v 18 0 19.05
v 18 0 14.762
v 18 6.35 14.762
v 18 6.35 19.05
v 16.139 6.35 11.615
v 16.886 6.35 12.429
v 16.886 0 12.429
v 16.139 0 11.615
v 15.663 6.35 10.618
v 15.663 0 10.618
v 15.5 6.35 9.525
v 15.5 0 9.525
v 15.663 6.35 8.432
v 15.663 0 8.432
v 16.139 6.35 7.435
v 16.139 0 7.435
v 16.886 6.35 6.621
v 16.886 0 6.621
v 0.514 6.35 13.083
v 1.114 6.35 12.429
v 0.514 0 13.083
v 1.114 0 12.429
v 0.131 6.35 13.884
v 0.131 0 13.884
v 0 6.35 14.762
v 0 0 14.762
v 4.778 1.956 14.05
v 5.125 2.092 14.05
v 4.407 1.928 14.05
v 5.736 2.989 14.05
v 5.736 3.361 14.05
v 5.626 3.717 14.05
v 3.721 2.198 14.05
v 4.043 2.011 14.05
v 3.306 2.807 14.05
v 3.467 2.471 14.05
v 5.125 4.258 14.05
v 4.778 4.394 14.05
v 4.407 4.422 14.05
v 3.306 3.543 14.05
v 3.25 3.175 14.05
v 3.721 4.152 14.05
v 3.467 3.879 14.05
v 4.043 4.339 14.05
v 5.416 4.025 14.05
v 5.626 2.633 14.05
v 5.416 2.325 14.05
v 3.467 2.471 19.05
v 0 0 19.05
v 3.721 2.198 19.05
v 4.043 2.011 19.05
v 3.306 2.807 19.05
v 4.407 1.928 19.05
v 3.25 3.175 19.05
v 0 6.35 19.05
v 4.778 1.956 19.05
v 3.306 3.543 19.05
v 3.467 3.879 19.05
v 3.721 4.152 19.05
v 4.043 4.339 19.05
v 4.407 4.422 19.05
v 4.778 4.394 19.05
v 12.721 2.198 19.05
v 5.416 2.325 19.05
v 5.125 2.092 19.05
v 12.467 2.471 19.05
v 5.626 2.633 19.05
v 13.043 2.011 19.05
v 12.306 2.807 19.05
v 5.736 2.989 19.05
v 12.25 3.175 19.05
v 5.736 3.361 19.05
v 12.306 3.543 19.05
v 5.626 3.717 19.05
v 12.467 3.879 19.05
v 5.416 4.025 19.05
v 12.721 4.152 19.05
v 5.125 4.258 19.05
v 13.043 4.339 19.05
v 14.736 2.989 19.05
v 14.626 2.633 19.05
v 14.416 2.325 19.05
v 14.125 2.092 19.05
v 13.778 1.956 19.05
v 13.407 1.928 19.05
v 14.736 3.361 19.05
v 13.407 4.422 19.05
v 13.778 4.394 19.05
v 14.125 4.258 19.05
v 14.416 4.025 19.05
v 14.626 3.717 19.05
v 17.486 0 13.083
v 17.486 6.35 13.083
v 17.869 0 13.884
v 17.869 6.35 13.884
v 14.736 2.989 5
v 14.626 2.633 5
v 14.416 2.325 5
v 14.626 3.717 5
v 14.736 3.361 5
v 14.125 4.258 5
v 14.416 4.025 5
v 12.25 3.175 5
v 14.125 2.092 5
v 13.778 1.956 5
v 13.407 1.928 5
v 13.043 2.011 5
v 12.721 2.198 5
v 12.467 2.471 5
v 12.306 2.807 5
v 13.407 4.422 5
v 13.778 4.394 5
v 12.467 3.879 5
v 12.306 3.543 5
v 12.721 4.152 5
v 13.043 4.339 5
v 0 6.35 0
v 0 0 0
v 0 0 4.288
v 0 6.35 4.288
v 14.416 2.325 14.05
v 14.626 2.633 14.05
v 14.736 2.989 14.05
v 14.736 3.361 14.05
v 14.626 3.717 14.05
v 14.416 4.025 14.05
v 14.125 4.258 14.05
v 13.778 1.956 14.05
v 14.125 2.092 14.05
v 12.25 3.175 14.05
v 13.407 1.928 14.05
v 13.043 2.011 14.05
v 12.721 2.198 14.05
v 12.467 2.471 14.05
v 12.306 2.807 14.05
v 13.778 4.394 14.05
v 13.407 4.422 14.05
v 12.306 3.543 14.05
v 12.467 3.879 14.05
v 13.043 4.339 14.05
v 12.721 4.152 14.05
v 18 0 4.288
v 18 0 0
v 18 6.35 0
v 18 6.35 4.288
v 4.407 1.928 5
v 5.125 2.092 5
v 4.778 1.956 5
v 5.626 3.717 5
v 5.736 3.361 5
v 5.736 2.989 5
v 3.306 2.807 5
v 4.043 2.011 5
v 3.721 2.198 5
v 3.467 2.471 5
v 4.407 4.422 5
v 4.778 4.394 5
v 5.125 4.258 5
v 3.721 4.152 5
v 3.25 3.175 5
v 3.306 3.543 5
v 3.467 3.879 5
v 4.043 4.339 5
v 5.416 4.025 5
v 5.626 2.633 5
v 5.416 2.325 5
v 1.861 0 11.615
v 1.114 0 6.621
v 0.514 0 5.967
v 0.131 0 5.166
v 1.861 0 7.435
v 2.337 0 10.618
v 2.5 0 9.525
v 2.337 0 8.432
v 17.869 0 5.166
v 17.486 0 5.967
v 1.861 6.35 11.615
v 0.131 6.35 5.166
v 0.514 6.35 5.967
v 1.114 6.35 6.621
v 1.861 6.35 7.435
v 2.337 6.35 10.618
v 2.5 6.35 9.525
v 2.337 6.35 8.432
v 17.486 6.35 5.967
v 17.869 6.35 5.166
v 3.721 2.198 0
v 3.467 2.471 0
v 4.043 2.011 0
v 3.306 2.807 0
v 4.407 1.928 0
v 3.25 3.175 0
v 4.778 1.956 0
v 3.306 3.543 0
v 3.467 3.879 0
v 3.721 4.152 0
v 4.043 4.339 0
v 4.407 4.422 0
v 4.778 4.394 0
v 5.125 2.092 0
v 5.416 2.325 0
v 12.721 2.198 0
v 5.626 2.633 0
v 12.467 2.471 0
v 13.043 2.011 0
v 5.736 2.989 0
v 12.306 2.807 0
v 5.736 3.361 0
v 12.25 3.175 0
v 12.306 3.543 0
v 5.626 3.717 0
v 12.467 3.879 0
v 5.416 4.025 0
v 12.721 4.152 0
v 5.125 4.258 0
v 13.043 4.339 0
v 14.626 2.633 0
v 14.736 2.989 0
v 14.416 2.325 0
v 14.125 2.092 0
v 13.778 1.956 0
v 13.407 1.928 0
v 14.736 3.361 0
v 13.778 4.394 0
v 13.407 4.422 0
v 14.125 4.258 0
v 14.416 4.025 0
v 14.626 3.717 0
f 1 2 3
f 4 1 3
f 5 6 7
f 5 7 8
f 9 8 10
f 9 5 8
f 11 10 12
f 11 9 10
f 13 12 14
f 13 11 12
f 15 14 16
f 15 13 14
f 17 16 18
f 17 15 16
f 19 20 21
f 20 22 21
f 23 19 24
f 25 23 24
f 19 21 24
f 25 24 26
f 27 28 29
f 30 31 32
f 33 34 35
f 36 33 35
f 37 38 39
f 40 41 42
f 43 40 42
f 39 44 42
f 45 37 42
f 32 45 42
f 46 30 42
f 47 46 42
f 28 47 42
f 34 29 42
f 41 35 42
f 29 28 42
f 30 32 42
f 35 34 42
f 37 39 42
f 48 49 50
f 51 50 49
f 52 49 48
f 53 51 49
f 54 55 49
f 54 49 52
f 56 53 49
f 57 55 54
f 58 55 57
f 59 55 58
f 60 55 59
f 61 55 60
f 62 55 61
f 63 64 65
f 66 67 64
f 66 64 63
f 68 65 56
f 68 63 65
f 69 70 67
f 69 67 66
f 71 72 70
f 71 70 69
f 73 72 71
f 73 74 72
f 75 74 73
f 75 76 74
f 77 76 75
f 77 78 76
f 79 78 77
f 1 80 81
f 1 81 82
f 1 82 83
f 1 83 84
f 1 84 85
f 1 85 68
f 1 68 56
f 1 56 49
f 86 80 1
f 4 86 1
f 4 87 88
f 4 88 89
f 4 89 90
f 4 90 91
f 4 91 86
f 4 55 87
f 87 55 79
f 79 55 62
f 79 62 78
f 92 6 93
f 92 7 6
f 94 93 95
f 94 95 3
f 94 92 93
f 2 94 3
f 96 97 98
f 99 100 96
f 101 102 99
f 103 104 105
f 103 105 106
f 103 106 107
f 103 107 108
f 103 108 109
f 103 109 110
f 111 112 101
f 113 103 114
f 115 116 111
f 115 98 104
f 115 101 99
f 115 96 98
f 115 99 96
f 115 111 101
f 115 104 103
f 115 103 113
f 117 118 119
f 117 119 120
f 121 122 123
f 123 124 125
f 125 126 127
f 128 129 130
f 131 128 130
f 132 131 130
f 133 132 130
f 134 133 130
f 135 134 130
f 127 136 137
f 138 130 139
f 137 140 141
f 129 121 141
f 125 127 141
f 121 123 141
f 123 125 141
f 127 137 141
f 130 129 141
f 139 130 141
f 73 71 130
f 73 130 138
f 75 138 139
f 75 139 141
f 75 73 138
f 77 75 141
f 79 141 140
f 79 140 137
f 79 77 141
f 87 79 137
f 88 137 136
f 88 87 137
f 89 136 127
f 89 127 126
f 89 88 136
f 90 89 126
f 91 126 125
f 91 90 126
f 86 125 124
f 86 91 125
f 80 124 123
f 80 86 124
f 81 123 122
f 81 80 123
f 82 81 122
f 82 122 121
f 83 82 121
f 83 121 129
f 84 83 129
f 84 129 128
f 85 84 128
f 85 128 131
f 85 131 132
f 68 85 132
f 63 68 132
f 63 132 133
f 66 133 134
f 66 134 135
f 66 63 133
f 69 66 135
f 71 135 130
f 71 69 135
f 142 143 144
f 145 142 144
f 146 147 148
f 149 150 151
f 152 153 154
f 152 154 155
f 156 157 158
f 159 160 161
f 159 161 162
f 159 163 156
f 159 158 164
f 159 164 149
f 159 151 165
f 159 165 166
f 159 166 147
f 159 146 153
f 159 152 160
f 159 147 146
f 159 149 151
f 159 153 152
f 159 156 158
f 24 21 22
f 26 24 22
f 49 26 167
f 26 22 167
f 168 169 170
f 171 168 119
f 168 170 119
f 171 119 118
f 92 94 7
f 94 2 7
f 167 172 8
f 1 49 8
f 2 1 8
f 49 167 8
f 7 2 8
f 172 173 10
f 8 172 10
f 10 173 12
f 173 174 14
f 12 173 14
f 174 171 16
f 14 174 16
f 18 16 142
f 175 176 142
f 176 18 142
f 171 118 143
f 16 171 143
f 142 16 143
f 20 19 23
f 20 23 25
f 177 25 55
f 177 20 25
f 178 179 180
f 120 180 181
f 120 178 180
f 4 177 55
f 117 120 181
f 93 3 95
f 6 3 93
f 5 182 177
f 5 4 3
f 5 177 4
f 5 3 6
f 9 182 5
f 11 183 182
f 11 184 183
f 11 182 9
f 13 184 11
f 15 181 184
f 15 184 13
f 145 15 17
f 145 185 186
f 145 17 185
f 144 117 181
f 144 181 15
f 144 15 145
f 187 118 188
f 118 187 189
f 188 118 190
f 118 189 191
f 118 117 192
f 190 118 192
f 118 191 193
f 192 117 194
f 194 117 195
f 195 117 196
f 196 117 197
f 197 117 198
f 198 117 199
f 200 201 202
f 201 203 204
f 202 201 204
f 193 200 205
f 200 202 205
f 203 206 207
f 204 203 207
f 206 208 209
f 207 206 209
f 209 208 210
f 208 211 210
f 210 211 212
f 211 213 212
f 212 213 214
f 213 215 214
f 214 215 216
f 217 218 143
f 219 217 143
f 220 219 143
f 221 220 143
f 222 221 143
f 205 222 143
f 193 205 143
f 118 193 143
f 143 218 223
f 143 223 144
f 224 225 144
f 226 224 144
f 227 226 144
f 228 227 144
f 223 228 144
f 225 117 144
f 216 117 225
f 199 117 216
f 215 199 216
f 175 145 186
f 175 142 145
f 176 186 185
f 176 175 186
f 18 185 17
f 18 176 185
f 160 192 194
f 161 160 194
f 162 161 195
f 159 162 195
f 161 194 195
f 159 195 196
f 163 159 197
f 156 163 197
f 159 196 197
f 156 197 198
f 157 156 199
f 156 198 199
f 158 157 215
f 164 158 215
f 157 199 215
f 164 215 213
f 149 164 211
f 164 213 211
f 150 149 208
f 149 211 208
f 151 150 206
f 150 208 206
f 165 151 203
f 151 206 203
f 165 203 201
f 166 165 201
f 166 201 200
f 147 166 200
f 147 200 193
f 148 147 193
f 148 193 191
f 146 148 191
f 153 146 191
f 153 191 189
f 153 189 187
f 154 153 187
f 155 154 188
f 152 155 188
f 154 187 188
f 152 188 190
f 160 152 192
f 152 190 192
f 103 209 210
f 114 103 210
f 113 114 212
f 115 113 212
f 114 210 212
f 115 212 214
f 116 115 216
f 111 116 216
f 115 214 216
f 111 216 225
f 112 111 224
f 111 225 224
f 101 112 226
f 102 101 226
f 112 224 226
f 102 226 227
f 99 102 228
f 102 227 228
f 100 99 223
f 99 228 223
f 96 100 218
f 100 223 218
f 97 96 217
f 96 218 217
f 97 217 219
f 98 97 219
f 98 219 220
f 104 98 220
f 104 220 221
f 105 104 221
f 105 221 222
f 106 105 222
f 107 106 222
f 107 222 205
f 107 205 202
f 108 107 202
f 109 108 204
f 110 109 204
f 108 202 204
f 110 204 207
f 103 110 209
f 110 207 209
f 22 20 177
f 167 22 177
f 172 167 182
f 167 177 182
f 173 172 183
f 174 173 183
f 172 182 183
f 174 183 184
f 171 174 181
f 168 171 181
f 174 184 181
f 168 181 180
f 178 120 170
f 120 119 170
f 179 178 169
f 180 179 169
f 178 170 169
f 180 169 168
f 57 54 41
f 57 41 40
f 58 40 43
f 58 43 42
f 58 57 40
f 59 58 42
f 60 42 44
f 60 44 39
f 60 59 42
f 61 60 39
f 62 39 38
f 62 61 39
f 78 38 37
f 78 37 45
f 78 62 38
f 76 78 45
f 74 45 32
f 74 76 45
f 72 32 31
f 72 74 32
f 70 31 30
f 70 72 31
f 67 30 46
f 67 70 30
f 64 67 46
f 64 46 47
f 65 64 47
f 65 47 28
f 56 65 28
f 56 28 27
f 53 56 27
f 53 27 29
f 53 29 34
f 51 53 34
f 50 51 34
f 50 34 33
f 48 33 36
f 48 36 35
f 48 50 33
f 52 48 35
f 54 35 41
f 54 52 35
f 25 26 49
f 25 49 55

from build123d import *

# Parameters (mm, degrees)
SKETCH1_W           = 18
SKETCH1_H           = 6.35
BOSS_EXTRUDE1_DEPTH = 19.05
CUT_EXTRUDE1_DEPTH  = 7.35
SKETCH3_R           = 1.25
CUT_EXTRUDE2_DEPTH  = 5
FILLET2_R           = 3


with BuildPart() as part:
    # Sketch1 → Boss-Extrude1 (new body)
    with BuildSketch(Plane.XY):
        with Locations((9, 3.175)):
            Rectangle(SKETCH1_W, SKETCH1_H)
    extrude(amount=BOSS_EXTRUDE1_DEPTH)

    # Sketch2 → Cut-Extrude1 (cut, through all)
    with BuildSketch(Plane(origin=(0, 6.35, 0), x_dir=(1, 0, 0), z_dir=(0, 1, 0))):
        with BuildLine():
            Line((18, -6), (18, -13.05))
            ThreePointArc((18, -13.05), (15.5, -9.525), (18, -6))
        make_face()
        with BuildLine():
            Line((0, -6), (0, -13.05))
            ThreePointArc((0, -13.05), (2.5, -9.525), (0, -6))
        make_face()
    extrude(amount=-CUT_EXTRUDE1_DEPTH, mode=Mode.SUBTRACT)

    # Sketch3 → Cut-Extrude2 (cut)
    with BuildSketch(Plane(origin=(0, 0, 0), x_dir=(-1, 0, 0), z_dir=(0, 0, -1))):
        with Locations((-13.5, 3.175)):
            Circle(SKETCH3_R)
        with Locations((-4.5, 3.175)):
            Circle(SKETCH3_R)
    cut_extrude2 = extrude(amount=-CUT_EXTRUDE2_DEPTH, mode=Mode.SUBTRACT)

    # Mirror1: Cut-Extrude2 across plane
    add(cut_extrude2.mirror(Plane(origin=(0, 0, 9.525), x_dir=(1, 0, 0), z_dir=(0, 0, -1))), mode=Mode.SUBTRACT)

    # Fillet2
    fillet2_edges = [part.edges().sort_by_distance(p)[0] for p in [
        (18, 3.175, 13.05),
        (18, 3.175, 6),
        (0, 3.175, 6),
        (0, 3.175, 13.05),
    ]]
    fillet(fillet2_edges, radius=FILLET2_R)


solid = part.part
